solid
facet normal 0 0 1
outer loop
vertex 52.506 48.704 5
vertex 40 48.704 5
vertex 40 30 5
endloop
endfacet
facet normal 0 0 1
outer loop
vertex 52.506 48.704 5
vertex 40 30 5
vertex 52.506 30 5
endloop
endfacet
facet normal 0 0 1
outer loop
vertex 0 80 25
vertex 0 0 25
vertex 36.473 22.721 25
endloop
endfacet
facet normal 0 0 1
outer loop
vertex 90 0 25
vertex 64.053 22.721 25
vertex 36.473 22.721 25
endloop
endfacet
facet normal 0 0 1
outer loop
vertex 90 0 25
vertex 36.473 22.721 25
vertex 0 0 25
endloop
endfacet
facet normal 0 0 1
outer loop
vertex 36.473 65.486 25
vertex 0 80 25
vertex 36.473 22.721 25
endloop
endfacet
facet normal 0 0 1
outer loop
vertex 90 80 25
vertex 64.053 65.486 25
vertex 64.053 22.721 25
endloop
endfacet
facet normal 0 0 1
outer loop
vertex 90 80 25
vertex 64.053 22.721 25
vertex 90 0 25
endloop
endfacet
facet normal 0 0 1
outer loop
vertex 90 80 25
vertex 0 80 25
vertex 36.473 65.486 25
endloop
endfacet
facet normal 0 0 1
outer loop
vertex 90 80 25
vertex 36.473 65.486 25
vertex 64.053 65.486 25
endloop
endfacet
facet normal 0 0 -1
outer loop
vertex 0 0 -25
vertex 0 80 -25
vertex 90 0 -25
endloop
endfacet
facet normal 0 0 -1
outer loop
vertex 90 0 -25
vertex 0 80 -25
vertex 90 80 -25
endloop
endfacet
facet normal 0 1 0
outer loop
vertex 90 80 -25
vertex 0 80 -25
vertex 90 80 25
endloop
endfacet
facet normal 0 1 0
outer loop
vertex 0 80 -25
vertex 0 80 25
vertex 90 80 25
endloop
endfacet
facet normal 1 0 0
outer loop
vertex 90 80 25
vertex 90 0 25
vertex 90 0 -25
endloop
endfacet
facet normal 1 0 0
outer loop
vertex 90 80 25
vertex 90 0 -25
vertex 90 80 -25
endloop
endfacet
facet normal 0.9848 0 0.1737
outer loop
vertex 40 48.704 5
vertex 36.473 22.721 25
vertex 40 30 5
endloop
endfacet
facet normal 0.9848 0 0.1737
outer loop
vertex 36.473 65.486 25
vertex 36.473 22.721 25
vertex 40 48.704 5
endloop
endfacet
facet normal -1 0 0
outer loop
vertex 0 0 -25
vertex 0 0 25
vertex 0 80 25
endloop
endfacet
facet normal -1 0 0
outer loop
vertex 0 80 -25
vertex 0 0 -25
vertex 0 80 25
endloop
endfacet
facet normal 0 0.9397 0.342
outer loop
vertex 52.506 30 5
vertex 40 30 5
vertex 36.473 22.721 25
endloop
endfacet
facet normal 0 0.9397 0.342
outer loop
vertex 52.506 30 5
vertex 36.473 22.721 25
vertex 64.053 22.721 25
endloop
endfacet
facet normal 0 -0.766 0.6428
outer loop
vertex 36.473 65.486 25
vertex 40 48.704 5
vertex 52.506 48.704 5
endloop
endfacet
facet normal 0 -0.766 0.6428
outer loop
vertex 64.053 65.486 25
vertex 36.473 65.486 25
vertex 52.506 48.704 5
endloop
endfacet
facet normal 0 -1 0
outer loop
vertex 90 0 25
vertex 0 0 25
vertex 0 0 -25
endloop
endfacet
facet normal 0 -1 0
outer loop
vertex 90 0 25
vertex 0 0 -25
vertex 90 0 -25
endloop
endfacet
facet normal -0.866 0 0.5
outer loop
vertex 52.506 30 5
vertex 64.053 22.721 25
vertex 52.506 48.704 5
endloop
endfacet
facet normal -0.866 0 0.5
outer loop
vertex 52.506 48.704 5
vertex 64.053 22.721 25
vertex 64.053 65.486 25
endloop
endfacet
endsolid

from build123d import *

# Parameters (mm, degrees)
SKETCH1_W     = 90
SKETCH1_H     = 80
BASE_DEPTH    = 25
SKETCH2_W     = 12.505871318
SKETCH2_H     = 18.704284341
POCKET_DEPTH  = 20
DRAFT10_ANGLE = 10
DRAFT20_ANGLE = 20
DRAFT30_ANGLE = 30
DRAFT40_ANGLE = 40


with BuildPart() as part:
    # Sketch1 → Base (new body, symmetric)
    with BuildSketch(Plane.XY):
        with Locations((45, 40)):
            Rectangle(SKETCH1_W, SKETCH1_H)
    extrude(amount=BASE_DEPTH, both=True)

    # Sketch2 → Pocket (cut)
    with BuildSketch(Plane.XY.offset(25)):
        with Locations((46.252935659, 39.352142171)):
            Rectangle(SKETCH2_W, SKETCH2_H)
    extrude(amount=-POCKET_DEPTH, mode=Mode.SUBTRACT)

    # Draft10
    draft10_faces = [part.faces().sort_by_distance(p)[0] for p in [
        (40, 39.35214217, 15),
    ]]
    draft(draft10_faces, Plane(origin=(40, 48.704284341, 5), x_dir=(1, 0, 0), z_dir=(0, 0, 1)), DRAFT10_ANGLE)

    # Draft20
    draft20_faces = [part.faces().sort_by_distance(p)[0] for p in [
        (45.334985554, 30, 15.411907484),
    ]]
    draft(draft20_faces, Plane(origin=(40, 48.704284341, 5), x_dir=(1, 0, 0), z_dir=(0, 0, 1)), DRAFT20_ANGLE)

    # Draft30
    draft30_faces = [part.faces().sort_by_distance(p)[0] for p in [
        (52.505871318, 37.433476694, 15.542980146),
    ]]
    draft(draft30_faces, Plane(origin=(40, 48.704284341, 5), x_dir=(1, 0, 0), z_dir=(0, 0, 1)), DRAFT30_ANGLE)

    # Draft40
    draft40_faces = [part.faces().sort_by_distance(p)[0] for p in [
        (48.509384653, 48.704284341, 16.253456142),
    ]]
    draft(draft40_faces, Plane(origin=(40, 48.704284341, 5), x_dir=(1, 0, 0), z_dir=(0, 0, 1)), DRAFT40_ANGLE)


solid = part.part
